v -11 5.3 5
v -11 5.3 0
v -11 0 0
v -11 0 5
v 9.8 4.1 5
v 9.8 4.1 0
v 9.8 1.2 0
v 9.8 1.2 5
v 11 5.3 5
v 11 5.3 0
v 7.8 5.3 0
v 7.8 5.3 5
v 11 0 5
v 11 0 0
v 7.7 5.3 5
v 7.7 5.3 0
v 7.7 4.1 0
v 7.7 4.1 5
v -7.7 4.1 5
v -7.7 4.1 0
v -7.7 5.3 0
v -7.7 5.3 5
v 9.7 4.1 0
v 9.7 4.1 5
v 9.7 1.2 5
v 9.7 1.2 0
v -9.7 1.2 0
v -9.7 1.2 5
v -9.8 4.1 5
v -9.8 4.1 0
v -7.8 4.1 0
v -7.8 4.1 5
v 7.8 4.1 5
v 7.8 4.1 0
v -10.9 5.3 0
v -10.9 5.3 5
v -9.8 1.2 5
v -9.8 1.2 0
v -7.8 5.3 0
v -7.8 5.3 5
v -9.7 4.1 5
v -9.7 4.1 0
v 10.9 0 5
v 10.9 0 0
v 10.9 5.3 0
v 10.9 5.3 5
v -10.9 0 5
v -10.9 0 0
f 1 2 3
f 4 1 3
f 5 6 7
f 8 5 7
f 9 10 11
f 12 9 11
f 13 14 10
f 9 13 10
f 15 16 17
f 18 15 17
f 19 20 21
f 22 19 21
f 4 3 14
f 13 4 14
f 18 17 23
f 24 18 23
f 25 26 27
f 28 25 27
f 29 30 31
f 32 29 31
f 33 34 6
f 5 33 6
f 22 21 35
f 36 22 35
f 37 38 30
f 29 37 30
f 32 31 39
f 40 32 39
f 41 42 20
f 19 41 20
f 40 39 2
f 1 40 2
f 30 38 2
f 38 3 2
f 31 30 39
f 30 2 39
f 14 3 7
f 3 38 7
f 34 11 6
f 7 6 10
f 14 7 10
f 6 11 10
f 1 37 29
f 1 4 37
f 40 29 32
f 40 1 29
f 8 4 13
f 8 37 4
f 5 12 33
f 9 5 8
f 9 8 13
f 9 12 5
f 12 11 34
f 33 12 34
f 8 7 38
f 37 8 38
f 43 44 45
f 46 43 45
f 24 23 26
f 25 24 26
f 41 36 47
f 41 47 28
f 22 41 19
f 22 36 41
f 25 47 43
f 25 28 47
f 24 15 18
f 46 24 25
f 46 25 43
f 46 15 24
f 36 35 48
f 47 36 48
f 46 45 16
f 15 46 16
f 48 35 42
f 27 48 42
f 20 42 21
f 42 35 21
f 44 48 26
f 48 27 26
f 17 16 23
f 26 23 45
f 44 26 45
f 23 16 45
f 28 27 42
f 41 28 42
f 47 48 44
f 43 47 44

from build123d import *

# Parameters (mm, degrees)
F1_DEPTH = 5
F3_DEPTH = 5


with BuildPart() as f1:
    # F0 (on Top) → F1 (new body)
    with BuildSketch(Plane.XY):
        Polygon((-11, 0), (0, 0), (0, 1.2), (-9.8, 1.2), (-9.8, 4.1), (-7.8, 4.1), (-7.8, 5.3), (-11, 5.3), align=None)
        Polygon((0, 1.2), (0, 0), (11, 0), (11, 5.3), (7.8, 5.3), (7.8, 4.1), (9.8, 4.1), (9.8, 1.2), align=None)
    extrude(amount=F1_DEPTH)


with BuildPart() as f3:
    # F2 (on Top) → F3 (new body)
    with BuildSketch(Plane.XY):
        Polygon((-10.9, 0), (0, 0), (0, 1.2), (-9.7, 1.2), (-9.7, 4.1), (-7.7, 4.1), (-7.7, 5.3), (-10.9, 5.3), align=None)
        Polygon((0, 1.2), (0, 0), (10.9, 0), (10.9, 5.3), (7.7, 5.3), (7.7, 4.1), (9.7, 4.1), (9.7, 1.2), align=None)
    extrude(amount=F3_DEPTH)


solid = Compound([f1.part, f3.part])
